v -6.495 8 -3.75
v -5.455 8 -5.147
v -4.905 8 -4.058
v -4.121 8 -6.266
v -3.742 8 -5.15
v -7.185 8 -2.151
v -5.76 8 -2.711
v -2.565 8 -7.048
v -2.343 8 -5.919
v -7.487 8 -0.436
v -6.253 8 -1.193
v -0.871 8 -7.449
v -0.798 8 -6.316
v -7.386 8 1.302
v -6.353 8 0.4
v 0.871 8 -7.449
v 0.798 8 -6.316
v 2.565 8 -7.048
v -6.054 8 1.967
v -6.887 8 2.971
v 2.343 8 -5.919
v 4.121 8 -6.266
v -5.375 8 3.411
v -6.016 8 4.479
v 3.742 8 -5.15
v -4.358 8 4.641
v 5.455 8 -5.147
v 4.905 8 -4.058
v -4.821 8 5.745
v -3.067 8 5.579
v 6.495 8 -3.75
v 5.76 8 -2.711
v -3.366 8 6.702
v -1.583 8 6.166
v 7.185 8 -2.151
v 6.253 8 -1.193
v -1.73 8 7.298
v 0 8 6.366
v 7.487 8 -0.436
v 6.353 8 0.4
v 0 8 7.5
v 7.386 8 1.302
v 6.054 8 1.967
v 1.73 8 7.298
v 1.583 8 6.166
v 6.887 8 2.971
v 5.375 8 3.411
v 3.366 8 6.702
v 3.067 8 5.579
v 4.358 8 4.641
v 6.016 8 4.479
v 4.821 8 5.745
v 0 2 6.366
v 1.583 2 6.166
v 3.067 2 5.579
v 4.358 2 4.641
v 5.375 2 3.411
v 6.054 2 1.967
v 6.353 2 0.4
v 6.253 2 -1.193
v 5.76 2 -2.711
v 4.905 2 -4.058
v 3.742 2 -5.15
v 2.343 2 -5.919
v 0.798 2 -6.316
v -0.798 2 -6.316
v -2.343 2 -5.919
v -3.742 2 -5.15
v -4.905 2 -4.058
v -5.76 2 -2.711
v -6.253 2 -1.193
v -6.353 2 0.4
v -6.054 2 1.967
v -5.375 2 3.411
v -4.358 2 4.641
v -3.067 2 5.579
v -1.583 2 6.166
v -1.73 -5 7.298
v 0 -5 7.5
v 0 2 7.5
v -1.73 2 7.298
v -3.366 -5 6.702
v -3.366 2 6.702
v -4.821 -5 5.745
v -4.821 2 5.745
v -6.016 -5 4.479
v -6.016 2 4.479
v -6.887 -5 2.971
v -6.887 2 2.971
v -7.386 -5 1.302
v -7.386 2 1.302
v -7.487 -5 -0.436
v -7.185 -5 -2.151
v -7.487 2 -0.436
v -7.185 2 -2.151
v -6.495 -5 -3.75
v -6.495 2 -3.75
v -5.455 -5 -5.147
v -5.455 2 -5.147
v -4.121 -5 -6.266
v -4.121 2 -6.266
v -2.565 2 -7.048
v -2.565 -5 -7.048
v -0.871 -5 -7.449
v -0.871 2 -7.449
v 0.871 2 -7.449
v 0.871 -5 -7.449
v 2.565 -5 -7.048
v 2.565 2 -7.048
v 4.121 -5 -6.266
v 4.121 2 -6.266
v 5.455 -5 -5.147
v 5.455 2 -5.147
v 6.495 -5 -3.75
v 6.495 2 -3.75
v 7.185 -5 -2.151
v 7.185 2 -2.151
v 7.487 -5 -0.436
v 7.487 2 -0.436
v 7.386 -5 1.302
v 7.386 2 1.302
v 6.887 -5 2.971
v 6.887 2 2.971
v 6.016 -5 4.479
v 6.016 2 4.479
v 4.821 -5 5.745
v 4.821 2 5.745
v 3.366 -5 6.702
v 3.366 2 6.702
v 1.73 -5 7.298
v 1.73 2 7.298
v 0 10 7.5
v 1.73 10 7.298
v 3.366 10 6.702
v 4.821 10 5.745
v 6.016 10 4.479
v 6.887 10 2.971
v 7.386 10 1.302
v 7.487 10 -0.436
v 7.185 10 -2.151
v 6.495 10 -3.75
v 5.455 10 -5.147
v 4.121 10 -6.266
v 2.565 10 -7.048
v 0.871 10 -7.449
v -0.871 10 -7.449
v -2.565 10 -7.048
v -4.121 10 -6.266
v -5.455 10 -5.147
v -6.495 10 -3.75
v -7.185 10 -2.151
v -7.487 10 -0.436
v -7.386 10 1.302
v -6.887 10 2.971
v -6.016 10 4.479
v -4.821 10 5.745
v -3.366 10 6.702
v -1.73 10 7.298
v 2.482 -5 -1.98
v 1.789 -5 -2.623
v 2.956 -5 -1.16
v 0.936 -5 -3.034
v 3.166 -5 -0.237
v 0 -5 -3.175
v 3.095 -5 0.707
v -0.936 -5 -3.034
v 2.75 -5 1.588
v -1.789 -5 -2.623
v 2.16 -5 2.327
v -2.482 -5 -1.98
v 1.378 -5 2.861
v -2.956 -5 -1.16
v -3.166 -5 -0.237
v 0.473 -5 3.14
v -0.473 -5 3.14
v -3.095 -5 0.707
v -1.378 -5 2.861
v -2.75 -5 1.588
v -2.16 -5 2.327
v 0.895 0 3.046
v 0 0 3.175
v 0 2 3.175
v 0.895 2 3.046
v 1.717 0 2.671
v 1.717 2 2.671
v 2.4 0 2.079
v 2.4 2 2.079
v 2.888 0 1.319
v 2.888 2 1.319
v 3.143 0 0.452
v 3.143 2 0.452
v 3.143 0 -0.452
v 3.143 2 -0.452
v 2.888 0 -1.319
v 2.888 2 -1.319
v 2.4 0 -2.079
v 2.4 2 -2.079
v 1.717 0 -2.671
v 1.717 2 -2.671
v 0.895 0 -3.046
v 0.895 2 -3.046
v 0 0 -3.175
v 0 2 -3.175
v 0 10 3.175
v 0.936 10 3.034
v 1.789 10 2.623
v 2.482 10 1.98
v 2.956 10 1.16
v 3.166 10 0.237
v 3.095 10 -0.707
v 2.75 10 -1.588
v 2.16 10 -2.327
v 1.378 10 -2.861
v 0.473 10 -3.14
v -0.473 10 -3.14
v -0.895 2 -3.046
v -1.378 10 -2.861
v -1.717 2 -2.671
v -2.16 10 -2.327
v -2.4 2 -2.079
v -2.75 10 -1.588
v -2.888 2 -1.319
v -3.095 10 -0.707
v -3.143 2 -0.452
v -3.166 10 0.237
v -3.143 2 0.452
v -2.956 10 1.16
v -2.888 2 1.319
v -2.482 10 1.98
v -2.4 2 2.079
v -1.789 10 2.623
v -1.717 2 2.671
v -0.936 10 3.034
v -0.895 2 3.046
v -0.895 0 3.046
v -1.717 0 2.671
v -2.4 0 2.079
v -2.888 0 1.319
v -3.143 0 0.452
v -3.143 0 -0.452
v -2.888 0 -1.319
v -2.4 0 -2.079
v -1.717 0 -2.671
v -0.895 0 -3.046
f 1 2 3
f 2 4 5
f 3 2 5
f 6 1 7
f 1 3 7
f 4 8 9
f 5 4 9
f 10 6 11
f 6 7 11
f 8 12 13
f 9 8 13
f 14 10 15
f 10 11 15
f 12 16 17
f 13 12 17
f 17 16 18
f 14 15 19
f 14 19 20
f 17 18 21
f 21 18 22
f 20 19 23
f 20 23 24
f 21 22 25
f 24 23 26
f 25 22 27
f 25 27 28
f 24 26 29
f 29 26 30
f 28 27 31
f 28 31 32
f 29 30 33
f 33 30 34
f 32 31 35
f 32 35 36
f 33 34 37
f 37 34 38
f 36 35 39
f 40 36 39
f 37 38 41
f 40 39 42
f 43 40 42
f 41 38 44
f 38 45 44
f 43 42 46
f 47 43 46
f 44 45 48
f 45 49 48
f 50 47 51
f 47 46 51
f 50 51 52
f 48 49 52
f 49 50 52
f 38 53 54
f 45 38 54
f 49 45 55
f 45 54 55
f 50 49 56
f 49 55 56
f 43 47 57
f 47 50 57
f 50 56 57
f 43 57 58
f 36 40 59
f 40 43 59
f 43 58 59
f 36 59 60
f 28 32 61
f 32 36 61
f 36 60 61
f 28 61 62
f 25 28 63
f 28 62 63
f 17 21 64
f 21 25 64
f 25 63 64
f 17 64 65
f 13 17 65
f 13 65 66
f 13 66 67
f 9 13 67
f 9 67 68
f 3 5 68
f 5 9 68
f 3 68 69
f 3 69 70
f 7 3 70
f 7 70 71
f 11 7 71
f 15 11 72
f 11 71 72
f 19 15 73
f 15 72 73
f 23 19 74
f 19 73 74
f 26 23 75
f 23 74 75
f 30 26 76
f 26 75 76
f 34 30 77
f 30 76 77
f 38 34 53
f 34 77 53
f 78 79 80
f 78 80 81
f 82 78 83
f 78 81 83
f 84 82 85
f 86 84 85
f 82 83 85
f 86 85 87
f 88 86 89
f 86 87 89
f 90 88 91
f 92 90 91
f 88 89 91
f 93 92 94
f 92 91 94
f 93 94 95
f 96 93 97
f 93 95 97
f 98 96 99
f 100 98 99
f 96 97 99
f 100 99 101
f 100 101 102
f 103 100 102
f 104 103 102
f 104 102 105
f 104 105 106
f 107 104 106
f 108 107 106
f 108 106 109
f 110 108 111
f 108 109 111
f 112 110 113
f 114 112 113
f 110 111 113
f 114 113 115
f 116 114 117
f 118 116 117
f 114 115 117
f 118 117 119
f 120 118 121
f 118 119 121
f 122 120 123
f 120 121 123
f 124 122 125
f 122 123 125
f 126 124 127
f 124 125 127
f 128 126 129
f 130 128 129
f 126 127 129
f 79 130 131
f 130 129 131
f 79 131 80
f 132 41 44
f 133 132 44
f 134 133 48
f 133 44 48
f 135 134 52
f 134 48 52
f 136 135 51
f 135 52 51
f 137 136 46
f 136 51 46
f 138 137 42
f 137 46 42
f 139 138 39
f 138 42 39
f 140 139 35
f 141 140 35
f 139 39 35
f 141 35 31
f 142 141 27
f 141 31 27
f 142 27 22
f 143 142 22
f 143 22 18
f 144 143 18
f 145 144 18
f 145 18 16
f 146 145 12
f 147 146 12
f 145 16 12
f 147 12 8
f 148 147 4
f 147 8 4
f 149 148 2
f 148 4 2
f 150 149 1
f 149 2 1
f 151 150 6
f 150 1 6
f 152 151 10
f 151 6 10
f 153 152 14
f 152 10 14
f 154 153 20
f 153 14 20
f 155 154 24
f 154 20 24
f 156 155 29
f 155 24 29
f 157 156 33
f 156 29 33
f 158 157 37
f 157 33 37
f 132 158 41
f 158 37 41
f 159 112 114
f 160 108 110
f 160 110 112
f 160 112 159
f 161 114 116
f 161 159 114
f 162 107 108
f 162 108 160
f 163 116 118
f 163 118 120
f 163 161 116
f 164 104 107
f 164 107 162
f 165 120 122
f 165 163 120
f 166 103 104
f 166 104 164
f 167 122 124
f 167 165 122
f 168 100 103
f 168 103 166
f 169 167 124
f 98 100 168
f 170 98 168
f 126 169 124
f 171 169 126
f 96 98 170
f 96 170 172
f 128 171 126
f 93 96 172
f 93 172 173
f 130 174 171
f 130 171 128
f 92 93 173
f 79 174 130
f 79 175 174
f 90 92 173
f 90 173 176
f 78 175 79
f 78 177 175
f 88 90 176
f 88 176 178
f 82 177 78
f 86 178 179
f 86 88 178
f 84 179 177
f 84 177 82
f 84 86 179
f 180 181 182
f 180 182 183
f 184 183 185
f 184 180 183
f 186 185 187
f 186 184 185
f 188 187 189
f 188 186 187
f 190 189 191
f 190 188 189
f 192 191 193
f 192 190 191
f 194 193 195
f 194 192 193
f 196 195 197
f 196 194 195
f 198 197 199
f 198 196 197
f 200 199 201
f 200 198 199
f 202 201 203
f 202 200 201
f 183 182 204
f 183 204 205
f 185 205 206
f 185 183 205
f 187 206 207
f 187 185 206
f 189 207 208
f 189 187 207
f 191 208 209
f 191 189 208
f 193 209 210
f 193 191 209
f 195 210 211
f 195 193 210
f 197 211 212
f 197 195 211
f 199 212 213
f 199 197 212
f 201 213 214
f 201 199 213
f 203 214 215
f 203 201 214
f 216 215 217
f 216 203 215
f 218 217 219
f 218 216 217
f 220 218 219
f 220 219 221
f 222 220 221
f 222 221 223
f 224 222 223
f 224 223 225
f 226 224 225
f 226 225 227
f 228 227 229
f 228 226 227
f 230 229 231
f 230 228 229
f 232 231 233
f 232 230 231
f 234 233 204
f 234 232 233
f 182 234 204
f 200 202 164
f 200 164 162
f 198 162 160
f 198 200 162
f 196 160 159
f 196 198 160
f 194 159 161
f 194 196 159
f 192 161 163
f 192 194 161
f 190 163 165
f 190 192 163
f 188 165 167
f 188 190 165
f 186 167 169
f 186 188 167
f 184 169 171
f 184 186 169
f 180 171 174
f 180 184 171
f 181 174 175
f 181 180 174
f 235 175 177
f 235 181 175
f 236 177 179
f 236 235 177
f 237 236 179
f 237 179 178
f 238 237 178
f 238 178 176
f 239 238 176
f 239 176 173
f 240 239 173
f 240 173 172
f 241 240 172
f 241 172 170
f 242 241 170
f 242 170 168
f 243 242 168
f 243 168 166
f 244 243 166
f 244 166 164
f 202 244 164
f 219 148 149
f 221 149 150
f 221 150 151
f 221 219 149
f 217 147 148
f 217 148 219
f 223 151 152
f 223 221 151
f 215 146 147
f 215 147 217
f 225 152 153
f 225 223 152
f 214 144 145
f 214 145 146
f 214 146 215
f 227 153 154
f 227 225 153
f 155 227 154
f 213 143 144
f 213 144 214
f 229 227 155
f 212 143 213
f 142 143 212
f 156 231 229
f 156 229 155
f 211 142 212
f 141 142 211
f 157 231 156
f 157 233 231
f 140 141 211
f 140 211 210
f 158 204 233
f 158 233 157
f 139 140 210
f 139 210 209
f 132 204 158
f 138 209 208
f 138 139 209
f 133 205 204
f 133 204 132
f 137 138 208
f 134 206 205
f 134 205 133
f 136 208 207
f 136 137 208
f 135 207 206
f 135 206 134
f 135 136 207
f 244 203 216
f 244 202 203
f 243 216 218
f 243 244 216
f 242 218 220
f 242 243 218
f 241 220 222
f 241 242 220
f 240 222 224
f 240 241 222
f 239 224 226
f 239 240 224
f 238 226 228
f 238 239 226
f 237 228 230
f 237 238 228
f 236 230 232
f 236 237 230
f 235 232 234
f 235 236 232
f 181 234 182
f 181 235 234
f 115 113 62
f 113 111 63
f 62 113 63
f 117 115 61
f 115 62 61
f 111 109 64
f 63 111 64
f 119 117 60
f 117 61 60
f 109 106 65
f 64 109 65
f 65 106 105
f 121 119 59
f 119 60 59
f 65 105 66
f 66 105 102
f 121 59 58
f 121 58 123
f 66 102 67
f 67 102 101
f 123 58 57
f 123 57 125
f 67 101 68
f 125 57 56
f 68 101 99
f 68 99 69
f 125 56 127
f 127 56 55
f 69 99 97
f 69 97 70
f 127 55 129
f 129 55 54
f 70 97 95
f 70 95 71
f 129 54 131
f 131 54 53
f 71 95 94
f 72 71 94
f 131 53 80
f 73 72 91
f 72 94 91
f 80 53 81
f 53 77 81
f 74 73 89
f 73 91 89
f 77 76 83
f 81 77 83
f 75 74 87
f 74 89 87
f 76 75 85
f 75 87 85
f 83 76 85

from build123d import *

# Parameters (mm, degrees)
SKETCH1_R                = 6.366
SKETCH1_R_2              = 3.175
BOSS_EXTRUDE1_DEPTH      = 10
BOSS_EXTRUDE2_START      = -2
SKETCH2_R                = 7.5
SKETCH2_R_2              = 3.175
BOSS_EXTRUDE2_DEPTH      = 2
BOSS_EXTRUDE3_DEPTH      = 5
BOSS_EXTRUDE3_DEPTH_BACK = 2
SKETCH3_R                = 7.5
SKETCH3_R_2              = 3.175


with BuildPart() as part:
    # Sketch1 → Boss-Extrude1 (new body)
    with BuildSketch(Plane(origin=(0, 0, 0), x_dir=(1, 0, 0), z_dir=(0, 1, 0))):
        with Locations(Location((0, 0, 0), (0, 0, 270))):
            Circle(SKETCH1_R)
        with Locations(Location((0, 0, 0), (0, 0, 270))):
            Circle(SKETCH1_R_2, mode=Mode.SUBTRACT)
    extrude(amount=BOSS_EXTRUDE1_DEPTH)

    # Sketch2 → Boss-Extrude2 (add)
    with BuildSketch(Plane(origin=(0, 10, 0), x_dir=(1, 0, 0), z_dir=(0, 1, 0)).offset(BOSS_EXTRUDE2_START)):
        with Locations(Location((0, 0, 0), (0, 0, 270))):
            Circle(SKETCH2_R)
        with Locations(Location((0, 0, 0), (0, 0, 270))):
            Circle(SKETCH2_R_2, mode=Mode.SUBTRACT)
    extrude(amount=BOSS_EXTRUDE2_DEPTH)

    # Sketch3 → Boss-Extrude3 (add, two sides: drawn at the far end of the back side and taken through both)
    with BuildSketch(Plane.XZ.offset(-BOSS_EXTRUDE3_DEPTH_BACK)):
        with Locations(Location((0, 0, 0), (0, 0, 90))):
            Circle(SKETCH3_R)
        with Locations(Location((0, 0, 0), (0, 0, 270))):
            Circle(SKETCH3_R_2, mode=Mode.SUBTRACT)
    extrude(amount=BOSS_EXTRUDE3_DEPTH + BOSS_EXTRUDE3_DEPTH_BACK)


solid = part.part
